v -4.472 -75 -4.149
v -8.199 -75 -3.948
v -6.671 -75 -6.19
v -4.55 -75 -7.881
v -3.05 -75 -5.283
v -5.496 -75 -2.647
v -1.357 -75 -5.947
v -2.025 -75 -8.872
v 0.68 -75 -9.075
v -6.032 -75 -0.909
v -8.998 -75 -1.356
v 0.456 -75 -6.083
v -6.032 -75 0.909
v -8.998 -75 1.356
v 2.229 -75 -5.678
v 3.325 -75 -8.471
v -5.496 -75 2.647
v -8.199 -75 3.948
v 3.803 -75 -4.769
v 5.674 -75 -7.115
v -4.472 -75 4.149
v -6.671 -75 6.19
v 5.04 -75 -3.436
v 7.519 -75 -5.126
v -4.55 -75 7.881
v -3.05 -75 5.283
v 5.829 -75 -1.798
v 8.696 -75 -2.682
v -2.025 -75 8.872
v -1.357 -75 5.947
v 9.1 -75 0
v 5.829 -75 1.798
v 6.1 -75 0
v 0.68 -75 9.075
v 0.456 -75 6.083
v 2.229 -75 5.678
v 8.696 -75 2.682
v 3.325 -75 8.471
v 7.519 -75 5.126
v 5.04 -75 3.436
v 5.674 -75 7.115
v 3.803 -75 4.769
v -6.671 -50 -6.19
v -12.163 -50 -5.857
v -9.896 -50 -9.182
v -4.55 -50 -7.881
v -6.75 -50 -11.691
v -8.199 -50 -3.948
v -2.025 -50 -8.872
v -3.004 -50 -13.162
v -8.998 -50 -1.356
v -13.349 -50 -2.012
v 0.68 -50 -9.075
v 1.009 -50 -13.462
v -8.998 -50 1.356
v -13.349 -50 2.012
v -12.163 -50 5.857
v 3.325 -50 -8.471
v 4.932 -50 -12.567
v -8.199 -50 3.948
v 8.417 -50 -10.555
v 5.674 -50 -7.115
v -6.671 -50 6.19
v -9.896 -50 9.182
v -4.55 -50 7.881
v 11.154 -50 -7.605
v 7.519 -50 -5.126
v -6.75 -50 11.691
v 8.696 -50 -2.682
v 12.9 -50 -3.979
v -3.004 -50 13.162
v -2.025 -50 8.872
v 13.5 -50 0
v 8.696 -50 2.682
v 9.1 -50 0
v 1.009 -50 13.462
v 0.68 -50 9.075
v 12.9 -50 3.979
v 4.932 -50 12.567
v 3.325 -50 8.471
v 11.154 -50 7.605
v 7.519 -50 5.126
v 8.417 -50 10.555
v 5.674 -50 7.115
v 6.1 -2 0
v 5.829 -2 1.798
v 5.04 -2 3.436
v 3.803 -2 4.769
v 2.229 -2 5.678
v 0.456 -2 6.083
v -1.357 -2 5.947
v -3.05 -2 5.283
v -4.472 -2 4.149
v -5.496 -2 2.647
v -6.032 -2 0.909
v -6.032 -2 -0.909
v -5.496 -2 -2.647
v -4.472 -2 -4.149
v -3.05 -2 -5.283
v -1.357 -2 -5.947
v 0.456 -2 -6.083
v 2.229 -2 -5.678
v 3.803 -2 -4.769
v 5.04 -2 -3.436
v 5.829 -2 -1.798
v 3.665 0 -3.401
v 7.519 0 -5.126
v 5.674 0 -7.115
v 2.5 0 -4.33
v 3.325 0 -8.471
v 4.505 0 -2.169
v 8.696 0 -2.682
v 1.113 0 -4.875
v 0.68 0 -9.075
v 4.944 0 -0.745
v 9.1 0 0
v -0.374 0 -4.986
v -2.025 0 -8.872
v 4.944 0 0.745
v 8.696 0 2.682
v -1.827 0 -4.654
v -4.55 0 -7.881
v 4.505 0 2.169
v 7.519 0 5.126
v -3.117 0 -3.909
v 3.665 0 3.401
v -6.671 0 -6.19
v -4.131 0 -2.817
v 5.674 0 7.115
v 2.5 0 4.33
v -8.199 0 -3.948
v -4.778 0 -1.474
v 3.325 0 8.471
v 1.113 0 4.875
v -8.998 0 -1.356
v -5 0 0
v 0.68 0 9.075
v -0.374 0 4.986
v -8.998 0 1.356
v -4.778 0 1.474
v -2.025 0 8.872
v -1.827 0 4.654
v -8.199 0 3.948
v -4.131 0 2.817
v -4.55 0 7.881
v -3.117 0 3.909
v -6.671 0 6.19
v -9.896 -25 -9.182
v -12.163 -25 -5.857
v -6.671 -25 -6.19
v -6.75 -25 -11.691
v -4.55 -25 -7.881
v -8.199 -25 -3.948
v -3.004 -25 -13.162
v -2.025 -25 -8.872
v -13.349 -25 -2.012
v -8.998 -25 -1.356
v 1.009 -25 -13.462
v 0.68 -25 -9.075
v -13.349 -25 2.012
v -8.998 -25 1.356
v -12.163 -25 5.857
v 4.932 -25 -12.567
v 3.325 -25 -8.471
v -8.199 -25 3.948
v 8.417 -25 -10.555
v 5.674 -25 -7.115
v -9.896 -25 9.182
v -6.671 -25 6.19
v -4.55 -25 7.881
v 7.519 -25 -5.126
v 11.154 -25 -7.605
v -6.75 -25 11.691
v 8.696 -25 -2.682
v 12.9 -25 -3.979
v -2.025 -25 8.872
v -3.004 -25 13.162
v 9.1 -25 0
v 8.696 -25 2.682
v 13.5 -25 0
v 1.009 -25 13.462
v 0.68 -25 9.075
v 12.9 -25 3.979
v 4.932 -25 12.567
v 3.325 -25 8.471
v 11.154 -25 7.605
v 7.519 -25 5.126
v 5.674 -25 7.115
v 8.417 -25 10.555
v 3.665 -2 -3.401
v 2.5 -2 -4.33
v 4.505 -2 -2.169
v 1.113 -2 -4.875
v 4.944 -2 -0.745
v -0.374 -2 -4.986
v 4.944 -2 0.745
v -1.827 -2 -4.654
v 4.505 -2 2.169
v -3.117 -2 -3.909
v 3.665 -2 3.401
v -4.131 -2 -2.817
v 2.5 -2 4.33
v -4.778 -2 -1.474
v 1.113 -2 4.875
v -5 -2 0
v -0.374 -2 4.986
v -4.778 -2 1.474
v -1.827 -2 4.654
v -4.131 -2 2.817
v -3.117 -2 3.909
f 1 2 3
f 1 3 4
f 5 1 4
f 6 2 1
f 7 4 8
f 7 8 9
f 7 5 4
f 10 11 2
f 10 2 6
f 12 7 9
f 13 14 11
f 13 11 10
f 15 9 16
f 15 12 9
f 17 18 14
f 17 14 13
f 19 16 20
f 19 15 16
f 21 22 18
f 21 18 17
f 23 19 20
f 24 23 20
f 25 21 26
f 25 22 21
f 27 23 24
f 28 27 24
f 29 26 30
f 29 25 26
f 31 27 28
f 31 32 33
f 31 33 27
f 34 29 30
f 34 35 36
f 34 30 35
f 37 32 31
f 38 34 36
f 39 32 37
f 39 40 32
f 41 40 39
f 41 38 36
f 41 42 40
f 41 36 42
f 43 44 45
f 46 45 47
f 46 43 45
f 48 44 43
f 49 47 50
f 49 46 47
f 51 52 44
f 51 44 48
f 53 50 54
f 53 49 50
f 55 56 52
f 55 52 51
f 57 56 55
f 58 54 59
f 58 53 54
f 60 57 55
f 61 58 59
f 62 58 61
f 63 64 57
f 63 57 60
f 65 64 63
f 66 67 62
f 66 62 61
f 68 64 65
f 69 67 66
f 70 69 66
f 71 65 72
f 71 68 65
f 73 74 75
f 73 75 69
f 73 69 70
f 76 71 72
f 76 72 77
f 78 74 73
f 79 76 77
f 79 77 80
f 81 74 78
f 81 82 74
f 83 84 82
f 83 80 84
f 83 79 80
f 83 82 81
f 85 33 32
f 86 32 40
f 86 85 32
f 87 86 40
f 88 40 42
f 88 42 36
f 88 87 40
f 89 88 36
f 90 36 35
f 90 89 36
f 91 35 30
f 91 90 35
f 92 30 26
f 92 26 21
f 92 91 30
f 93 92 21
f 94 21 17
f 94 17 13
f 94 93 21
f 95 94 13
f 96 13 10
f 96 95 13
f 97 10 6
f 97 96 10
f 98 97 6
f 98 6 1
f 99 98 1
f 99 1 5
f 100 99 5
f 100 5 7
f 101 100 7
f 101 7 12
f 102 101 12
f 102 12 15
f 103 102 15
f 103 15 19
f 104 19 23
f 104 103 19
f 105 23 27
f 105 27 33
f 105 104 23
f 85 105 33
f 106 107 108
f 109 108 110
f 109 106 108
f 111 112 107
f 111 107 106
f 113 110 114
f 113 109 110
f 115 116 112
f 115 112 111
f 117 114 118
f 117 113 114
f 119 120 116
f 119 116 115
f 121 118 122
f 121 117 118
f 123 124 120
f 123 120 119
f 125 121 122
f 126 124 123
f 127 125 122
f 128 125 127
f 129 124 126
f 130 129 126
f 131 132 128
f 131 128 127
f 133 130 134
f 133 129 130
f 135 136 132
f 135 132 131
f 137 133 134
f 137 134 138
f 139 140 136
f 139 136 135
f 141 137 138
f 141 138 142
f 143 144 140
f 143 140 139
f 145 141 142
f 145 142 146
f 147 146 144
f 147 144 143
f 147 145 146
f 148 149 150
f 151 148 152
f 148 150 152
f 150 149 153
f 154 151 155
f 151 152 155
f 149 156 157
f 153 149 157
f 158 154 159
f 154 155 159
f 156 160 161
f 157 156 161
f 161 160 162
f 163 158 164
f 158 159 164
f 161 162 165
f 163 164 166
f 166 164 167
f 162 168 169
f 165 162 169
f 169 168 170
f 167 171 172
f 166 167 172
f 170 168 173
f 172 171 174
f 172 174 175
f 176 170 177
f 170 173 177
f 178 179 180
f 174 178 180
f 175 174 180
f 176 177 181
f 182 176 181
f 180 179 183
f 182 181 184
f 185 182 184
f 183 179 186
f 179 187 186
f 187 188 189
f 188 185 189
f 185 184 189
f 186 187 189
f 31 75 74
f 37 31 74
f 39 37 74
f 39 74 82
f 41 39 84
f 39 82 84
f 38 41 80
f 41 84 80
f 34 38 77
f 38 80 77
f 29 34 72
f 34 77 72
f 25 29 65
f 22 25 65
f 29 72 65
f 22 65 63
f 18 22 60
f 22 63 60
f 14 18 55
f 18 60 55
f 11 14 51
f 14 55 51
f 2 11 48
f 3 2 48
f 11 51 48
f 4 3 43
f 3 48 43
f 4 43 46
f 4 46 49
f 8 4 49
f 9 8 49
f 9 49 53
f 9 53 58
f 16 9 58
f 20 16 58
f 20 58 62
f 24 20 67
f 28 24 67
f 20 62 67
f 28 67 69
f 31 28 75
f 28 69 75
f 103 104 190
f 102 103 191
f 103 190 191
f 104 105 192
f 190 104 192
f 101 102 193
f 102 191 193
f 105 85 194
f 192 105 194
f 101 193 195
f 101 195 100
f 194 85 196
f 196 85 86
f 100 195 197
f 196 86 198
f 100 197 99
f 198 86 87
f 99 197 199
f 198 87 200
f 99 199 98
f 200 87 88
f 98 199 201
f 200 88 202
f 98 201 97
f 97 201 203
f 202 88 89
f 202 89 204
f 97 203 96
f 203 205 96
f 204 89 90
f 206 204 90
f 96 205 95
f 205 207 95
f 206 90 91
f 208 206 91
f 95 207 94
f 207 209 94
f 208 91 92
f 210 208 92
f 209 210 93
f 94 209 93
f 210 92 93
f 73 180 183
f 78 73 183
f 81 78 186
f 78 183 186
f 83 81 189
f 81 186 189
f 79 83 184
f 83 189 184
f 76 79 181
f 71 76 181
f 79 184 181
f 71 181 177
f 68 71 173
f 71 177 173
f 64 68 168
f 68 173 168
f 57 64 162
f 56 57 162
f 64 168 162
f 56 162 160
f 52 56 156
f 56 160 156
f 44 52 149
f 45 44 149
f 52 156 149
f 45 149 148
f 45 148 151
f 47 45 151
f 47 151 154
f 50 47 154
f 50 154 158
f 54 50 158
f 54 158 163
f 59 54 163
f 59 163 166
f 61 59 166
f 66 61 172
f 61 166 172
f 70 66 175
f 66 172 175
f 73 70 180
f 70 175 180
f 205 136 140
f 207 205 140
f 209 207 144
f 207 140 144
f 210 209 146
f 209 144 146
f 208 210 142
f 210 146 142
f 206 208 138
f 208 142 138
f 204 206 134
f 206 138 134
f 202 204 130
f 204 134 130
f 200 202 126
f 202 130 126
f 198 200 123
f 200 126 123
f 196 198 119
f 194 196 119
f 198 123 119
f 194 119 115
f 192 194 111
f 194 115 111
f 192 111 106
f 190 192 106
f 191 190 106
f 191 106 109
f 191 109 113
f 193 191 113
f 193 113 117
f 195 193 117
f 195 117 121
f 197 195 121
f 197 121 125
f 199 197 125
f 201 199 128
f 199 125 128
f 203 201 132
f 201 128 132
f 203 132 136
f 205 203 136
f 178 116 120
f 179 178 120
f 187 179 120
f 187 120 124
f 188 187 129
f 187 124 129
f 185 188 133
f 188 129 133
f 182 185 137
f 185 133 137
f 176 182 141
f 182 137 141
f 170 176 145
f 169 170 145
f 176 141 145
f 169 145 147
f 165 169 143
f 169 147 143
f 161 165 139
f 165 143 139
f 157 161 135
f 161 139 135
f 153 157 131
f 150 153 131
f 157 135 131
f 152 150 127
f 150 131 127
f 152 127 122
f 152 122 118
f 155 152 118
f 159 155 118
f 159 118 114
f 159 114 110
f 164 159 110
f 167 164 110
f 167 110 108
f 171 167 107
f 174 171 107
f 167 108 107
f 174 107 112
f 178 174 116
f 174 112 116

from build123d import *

# Parameters (mm, degrees)
F0_R     = 9.1
F0_R_2   = 6.1
F1_DEPTH = 25
F2_R     = 13.5
F2_R_2   = 9.1
F2_R_3   = 6.1
F3_DEPTH = 25
F4_R     = 9.1
F4_R_2   = 6.1
F5_DEPTH = 25
F6_R     = 6.1
F6_R_2   = 5
F7_DEPTH = 2


with BuildPart() as f1:
    # F0 (on Front) → F1 (new body)
    with BuildSketch(Plane.XZ):
        Circle(F0_R)
        Circle(F0_R_2, mode=Mode.SUBTRACT)
    extrude(amount=F1_DEPTH)

    # F2 (on face) → F3 (join)
    with BuildSketch(Plane.XZ.offset(25)):
        Circle(F2_R)
        Circle(F2_R_2, mode=Mode.SUBTRACT)
        Circle(F2_R_2)
        Circle(F2_R_3, mode=Mode.SUBTRACT)
    extrude(amount=F3_DEPTH)

    # F4 (on face) → F5 (join)
    with BuildSketch(Plane.XZ.offset(50)):
        Circle(F4_R)
        Circle(F4_R_2, mode=Mode.SUBTRACT)
    extrude(amount=F5_DEPTH)

    # F6 (on face) → F7 (join)
    with BuildSketch(Plane(origin=(0, 0, 0), x_dir=(-1, 0, 0), z_dir=(0, 1, 0))):
        Circle(F6_R)
        Circle(F6_R_2, mode=Mode.SUBTRACT)
    extrude(amount=-F7_DEPTH)


solid = f1.part
